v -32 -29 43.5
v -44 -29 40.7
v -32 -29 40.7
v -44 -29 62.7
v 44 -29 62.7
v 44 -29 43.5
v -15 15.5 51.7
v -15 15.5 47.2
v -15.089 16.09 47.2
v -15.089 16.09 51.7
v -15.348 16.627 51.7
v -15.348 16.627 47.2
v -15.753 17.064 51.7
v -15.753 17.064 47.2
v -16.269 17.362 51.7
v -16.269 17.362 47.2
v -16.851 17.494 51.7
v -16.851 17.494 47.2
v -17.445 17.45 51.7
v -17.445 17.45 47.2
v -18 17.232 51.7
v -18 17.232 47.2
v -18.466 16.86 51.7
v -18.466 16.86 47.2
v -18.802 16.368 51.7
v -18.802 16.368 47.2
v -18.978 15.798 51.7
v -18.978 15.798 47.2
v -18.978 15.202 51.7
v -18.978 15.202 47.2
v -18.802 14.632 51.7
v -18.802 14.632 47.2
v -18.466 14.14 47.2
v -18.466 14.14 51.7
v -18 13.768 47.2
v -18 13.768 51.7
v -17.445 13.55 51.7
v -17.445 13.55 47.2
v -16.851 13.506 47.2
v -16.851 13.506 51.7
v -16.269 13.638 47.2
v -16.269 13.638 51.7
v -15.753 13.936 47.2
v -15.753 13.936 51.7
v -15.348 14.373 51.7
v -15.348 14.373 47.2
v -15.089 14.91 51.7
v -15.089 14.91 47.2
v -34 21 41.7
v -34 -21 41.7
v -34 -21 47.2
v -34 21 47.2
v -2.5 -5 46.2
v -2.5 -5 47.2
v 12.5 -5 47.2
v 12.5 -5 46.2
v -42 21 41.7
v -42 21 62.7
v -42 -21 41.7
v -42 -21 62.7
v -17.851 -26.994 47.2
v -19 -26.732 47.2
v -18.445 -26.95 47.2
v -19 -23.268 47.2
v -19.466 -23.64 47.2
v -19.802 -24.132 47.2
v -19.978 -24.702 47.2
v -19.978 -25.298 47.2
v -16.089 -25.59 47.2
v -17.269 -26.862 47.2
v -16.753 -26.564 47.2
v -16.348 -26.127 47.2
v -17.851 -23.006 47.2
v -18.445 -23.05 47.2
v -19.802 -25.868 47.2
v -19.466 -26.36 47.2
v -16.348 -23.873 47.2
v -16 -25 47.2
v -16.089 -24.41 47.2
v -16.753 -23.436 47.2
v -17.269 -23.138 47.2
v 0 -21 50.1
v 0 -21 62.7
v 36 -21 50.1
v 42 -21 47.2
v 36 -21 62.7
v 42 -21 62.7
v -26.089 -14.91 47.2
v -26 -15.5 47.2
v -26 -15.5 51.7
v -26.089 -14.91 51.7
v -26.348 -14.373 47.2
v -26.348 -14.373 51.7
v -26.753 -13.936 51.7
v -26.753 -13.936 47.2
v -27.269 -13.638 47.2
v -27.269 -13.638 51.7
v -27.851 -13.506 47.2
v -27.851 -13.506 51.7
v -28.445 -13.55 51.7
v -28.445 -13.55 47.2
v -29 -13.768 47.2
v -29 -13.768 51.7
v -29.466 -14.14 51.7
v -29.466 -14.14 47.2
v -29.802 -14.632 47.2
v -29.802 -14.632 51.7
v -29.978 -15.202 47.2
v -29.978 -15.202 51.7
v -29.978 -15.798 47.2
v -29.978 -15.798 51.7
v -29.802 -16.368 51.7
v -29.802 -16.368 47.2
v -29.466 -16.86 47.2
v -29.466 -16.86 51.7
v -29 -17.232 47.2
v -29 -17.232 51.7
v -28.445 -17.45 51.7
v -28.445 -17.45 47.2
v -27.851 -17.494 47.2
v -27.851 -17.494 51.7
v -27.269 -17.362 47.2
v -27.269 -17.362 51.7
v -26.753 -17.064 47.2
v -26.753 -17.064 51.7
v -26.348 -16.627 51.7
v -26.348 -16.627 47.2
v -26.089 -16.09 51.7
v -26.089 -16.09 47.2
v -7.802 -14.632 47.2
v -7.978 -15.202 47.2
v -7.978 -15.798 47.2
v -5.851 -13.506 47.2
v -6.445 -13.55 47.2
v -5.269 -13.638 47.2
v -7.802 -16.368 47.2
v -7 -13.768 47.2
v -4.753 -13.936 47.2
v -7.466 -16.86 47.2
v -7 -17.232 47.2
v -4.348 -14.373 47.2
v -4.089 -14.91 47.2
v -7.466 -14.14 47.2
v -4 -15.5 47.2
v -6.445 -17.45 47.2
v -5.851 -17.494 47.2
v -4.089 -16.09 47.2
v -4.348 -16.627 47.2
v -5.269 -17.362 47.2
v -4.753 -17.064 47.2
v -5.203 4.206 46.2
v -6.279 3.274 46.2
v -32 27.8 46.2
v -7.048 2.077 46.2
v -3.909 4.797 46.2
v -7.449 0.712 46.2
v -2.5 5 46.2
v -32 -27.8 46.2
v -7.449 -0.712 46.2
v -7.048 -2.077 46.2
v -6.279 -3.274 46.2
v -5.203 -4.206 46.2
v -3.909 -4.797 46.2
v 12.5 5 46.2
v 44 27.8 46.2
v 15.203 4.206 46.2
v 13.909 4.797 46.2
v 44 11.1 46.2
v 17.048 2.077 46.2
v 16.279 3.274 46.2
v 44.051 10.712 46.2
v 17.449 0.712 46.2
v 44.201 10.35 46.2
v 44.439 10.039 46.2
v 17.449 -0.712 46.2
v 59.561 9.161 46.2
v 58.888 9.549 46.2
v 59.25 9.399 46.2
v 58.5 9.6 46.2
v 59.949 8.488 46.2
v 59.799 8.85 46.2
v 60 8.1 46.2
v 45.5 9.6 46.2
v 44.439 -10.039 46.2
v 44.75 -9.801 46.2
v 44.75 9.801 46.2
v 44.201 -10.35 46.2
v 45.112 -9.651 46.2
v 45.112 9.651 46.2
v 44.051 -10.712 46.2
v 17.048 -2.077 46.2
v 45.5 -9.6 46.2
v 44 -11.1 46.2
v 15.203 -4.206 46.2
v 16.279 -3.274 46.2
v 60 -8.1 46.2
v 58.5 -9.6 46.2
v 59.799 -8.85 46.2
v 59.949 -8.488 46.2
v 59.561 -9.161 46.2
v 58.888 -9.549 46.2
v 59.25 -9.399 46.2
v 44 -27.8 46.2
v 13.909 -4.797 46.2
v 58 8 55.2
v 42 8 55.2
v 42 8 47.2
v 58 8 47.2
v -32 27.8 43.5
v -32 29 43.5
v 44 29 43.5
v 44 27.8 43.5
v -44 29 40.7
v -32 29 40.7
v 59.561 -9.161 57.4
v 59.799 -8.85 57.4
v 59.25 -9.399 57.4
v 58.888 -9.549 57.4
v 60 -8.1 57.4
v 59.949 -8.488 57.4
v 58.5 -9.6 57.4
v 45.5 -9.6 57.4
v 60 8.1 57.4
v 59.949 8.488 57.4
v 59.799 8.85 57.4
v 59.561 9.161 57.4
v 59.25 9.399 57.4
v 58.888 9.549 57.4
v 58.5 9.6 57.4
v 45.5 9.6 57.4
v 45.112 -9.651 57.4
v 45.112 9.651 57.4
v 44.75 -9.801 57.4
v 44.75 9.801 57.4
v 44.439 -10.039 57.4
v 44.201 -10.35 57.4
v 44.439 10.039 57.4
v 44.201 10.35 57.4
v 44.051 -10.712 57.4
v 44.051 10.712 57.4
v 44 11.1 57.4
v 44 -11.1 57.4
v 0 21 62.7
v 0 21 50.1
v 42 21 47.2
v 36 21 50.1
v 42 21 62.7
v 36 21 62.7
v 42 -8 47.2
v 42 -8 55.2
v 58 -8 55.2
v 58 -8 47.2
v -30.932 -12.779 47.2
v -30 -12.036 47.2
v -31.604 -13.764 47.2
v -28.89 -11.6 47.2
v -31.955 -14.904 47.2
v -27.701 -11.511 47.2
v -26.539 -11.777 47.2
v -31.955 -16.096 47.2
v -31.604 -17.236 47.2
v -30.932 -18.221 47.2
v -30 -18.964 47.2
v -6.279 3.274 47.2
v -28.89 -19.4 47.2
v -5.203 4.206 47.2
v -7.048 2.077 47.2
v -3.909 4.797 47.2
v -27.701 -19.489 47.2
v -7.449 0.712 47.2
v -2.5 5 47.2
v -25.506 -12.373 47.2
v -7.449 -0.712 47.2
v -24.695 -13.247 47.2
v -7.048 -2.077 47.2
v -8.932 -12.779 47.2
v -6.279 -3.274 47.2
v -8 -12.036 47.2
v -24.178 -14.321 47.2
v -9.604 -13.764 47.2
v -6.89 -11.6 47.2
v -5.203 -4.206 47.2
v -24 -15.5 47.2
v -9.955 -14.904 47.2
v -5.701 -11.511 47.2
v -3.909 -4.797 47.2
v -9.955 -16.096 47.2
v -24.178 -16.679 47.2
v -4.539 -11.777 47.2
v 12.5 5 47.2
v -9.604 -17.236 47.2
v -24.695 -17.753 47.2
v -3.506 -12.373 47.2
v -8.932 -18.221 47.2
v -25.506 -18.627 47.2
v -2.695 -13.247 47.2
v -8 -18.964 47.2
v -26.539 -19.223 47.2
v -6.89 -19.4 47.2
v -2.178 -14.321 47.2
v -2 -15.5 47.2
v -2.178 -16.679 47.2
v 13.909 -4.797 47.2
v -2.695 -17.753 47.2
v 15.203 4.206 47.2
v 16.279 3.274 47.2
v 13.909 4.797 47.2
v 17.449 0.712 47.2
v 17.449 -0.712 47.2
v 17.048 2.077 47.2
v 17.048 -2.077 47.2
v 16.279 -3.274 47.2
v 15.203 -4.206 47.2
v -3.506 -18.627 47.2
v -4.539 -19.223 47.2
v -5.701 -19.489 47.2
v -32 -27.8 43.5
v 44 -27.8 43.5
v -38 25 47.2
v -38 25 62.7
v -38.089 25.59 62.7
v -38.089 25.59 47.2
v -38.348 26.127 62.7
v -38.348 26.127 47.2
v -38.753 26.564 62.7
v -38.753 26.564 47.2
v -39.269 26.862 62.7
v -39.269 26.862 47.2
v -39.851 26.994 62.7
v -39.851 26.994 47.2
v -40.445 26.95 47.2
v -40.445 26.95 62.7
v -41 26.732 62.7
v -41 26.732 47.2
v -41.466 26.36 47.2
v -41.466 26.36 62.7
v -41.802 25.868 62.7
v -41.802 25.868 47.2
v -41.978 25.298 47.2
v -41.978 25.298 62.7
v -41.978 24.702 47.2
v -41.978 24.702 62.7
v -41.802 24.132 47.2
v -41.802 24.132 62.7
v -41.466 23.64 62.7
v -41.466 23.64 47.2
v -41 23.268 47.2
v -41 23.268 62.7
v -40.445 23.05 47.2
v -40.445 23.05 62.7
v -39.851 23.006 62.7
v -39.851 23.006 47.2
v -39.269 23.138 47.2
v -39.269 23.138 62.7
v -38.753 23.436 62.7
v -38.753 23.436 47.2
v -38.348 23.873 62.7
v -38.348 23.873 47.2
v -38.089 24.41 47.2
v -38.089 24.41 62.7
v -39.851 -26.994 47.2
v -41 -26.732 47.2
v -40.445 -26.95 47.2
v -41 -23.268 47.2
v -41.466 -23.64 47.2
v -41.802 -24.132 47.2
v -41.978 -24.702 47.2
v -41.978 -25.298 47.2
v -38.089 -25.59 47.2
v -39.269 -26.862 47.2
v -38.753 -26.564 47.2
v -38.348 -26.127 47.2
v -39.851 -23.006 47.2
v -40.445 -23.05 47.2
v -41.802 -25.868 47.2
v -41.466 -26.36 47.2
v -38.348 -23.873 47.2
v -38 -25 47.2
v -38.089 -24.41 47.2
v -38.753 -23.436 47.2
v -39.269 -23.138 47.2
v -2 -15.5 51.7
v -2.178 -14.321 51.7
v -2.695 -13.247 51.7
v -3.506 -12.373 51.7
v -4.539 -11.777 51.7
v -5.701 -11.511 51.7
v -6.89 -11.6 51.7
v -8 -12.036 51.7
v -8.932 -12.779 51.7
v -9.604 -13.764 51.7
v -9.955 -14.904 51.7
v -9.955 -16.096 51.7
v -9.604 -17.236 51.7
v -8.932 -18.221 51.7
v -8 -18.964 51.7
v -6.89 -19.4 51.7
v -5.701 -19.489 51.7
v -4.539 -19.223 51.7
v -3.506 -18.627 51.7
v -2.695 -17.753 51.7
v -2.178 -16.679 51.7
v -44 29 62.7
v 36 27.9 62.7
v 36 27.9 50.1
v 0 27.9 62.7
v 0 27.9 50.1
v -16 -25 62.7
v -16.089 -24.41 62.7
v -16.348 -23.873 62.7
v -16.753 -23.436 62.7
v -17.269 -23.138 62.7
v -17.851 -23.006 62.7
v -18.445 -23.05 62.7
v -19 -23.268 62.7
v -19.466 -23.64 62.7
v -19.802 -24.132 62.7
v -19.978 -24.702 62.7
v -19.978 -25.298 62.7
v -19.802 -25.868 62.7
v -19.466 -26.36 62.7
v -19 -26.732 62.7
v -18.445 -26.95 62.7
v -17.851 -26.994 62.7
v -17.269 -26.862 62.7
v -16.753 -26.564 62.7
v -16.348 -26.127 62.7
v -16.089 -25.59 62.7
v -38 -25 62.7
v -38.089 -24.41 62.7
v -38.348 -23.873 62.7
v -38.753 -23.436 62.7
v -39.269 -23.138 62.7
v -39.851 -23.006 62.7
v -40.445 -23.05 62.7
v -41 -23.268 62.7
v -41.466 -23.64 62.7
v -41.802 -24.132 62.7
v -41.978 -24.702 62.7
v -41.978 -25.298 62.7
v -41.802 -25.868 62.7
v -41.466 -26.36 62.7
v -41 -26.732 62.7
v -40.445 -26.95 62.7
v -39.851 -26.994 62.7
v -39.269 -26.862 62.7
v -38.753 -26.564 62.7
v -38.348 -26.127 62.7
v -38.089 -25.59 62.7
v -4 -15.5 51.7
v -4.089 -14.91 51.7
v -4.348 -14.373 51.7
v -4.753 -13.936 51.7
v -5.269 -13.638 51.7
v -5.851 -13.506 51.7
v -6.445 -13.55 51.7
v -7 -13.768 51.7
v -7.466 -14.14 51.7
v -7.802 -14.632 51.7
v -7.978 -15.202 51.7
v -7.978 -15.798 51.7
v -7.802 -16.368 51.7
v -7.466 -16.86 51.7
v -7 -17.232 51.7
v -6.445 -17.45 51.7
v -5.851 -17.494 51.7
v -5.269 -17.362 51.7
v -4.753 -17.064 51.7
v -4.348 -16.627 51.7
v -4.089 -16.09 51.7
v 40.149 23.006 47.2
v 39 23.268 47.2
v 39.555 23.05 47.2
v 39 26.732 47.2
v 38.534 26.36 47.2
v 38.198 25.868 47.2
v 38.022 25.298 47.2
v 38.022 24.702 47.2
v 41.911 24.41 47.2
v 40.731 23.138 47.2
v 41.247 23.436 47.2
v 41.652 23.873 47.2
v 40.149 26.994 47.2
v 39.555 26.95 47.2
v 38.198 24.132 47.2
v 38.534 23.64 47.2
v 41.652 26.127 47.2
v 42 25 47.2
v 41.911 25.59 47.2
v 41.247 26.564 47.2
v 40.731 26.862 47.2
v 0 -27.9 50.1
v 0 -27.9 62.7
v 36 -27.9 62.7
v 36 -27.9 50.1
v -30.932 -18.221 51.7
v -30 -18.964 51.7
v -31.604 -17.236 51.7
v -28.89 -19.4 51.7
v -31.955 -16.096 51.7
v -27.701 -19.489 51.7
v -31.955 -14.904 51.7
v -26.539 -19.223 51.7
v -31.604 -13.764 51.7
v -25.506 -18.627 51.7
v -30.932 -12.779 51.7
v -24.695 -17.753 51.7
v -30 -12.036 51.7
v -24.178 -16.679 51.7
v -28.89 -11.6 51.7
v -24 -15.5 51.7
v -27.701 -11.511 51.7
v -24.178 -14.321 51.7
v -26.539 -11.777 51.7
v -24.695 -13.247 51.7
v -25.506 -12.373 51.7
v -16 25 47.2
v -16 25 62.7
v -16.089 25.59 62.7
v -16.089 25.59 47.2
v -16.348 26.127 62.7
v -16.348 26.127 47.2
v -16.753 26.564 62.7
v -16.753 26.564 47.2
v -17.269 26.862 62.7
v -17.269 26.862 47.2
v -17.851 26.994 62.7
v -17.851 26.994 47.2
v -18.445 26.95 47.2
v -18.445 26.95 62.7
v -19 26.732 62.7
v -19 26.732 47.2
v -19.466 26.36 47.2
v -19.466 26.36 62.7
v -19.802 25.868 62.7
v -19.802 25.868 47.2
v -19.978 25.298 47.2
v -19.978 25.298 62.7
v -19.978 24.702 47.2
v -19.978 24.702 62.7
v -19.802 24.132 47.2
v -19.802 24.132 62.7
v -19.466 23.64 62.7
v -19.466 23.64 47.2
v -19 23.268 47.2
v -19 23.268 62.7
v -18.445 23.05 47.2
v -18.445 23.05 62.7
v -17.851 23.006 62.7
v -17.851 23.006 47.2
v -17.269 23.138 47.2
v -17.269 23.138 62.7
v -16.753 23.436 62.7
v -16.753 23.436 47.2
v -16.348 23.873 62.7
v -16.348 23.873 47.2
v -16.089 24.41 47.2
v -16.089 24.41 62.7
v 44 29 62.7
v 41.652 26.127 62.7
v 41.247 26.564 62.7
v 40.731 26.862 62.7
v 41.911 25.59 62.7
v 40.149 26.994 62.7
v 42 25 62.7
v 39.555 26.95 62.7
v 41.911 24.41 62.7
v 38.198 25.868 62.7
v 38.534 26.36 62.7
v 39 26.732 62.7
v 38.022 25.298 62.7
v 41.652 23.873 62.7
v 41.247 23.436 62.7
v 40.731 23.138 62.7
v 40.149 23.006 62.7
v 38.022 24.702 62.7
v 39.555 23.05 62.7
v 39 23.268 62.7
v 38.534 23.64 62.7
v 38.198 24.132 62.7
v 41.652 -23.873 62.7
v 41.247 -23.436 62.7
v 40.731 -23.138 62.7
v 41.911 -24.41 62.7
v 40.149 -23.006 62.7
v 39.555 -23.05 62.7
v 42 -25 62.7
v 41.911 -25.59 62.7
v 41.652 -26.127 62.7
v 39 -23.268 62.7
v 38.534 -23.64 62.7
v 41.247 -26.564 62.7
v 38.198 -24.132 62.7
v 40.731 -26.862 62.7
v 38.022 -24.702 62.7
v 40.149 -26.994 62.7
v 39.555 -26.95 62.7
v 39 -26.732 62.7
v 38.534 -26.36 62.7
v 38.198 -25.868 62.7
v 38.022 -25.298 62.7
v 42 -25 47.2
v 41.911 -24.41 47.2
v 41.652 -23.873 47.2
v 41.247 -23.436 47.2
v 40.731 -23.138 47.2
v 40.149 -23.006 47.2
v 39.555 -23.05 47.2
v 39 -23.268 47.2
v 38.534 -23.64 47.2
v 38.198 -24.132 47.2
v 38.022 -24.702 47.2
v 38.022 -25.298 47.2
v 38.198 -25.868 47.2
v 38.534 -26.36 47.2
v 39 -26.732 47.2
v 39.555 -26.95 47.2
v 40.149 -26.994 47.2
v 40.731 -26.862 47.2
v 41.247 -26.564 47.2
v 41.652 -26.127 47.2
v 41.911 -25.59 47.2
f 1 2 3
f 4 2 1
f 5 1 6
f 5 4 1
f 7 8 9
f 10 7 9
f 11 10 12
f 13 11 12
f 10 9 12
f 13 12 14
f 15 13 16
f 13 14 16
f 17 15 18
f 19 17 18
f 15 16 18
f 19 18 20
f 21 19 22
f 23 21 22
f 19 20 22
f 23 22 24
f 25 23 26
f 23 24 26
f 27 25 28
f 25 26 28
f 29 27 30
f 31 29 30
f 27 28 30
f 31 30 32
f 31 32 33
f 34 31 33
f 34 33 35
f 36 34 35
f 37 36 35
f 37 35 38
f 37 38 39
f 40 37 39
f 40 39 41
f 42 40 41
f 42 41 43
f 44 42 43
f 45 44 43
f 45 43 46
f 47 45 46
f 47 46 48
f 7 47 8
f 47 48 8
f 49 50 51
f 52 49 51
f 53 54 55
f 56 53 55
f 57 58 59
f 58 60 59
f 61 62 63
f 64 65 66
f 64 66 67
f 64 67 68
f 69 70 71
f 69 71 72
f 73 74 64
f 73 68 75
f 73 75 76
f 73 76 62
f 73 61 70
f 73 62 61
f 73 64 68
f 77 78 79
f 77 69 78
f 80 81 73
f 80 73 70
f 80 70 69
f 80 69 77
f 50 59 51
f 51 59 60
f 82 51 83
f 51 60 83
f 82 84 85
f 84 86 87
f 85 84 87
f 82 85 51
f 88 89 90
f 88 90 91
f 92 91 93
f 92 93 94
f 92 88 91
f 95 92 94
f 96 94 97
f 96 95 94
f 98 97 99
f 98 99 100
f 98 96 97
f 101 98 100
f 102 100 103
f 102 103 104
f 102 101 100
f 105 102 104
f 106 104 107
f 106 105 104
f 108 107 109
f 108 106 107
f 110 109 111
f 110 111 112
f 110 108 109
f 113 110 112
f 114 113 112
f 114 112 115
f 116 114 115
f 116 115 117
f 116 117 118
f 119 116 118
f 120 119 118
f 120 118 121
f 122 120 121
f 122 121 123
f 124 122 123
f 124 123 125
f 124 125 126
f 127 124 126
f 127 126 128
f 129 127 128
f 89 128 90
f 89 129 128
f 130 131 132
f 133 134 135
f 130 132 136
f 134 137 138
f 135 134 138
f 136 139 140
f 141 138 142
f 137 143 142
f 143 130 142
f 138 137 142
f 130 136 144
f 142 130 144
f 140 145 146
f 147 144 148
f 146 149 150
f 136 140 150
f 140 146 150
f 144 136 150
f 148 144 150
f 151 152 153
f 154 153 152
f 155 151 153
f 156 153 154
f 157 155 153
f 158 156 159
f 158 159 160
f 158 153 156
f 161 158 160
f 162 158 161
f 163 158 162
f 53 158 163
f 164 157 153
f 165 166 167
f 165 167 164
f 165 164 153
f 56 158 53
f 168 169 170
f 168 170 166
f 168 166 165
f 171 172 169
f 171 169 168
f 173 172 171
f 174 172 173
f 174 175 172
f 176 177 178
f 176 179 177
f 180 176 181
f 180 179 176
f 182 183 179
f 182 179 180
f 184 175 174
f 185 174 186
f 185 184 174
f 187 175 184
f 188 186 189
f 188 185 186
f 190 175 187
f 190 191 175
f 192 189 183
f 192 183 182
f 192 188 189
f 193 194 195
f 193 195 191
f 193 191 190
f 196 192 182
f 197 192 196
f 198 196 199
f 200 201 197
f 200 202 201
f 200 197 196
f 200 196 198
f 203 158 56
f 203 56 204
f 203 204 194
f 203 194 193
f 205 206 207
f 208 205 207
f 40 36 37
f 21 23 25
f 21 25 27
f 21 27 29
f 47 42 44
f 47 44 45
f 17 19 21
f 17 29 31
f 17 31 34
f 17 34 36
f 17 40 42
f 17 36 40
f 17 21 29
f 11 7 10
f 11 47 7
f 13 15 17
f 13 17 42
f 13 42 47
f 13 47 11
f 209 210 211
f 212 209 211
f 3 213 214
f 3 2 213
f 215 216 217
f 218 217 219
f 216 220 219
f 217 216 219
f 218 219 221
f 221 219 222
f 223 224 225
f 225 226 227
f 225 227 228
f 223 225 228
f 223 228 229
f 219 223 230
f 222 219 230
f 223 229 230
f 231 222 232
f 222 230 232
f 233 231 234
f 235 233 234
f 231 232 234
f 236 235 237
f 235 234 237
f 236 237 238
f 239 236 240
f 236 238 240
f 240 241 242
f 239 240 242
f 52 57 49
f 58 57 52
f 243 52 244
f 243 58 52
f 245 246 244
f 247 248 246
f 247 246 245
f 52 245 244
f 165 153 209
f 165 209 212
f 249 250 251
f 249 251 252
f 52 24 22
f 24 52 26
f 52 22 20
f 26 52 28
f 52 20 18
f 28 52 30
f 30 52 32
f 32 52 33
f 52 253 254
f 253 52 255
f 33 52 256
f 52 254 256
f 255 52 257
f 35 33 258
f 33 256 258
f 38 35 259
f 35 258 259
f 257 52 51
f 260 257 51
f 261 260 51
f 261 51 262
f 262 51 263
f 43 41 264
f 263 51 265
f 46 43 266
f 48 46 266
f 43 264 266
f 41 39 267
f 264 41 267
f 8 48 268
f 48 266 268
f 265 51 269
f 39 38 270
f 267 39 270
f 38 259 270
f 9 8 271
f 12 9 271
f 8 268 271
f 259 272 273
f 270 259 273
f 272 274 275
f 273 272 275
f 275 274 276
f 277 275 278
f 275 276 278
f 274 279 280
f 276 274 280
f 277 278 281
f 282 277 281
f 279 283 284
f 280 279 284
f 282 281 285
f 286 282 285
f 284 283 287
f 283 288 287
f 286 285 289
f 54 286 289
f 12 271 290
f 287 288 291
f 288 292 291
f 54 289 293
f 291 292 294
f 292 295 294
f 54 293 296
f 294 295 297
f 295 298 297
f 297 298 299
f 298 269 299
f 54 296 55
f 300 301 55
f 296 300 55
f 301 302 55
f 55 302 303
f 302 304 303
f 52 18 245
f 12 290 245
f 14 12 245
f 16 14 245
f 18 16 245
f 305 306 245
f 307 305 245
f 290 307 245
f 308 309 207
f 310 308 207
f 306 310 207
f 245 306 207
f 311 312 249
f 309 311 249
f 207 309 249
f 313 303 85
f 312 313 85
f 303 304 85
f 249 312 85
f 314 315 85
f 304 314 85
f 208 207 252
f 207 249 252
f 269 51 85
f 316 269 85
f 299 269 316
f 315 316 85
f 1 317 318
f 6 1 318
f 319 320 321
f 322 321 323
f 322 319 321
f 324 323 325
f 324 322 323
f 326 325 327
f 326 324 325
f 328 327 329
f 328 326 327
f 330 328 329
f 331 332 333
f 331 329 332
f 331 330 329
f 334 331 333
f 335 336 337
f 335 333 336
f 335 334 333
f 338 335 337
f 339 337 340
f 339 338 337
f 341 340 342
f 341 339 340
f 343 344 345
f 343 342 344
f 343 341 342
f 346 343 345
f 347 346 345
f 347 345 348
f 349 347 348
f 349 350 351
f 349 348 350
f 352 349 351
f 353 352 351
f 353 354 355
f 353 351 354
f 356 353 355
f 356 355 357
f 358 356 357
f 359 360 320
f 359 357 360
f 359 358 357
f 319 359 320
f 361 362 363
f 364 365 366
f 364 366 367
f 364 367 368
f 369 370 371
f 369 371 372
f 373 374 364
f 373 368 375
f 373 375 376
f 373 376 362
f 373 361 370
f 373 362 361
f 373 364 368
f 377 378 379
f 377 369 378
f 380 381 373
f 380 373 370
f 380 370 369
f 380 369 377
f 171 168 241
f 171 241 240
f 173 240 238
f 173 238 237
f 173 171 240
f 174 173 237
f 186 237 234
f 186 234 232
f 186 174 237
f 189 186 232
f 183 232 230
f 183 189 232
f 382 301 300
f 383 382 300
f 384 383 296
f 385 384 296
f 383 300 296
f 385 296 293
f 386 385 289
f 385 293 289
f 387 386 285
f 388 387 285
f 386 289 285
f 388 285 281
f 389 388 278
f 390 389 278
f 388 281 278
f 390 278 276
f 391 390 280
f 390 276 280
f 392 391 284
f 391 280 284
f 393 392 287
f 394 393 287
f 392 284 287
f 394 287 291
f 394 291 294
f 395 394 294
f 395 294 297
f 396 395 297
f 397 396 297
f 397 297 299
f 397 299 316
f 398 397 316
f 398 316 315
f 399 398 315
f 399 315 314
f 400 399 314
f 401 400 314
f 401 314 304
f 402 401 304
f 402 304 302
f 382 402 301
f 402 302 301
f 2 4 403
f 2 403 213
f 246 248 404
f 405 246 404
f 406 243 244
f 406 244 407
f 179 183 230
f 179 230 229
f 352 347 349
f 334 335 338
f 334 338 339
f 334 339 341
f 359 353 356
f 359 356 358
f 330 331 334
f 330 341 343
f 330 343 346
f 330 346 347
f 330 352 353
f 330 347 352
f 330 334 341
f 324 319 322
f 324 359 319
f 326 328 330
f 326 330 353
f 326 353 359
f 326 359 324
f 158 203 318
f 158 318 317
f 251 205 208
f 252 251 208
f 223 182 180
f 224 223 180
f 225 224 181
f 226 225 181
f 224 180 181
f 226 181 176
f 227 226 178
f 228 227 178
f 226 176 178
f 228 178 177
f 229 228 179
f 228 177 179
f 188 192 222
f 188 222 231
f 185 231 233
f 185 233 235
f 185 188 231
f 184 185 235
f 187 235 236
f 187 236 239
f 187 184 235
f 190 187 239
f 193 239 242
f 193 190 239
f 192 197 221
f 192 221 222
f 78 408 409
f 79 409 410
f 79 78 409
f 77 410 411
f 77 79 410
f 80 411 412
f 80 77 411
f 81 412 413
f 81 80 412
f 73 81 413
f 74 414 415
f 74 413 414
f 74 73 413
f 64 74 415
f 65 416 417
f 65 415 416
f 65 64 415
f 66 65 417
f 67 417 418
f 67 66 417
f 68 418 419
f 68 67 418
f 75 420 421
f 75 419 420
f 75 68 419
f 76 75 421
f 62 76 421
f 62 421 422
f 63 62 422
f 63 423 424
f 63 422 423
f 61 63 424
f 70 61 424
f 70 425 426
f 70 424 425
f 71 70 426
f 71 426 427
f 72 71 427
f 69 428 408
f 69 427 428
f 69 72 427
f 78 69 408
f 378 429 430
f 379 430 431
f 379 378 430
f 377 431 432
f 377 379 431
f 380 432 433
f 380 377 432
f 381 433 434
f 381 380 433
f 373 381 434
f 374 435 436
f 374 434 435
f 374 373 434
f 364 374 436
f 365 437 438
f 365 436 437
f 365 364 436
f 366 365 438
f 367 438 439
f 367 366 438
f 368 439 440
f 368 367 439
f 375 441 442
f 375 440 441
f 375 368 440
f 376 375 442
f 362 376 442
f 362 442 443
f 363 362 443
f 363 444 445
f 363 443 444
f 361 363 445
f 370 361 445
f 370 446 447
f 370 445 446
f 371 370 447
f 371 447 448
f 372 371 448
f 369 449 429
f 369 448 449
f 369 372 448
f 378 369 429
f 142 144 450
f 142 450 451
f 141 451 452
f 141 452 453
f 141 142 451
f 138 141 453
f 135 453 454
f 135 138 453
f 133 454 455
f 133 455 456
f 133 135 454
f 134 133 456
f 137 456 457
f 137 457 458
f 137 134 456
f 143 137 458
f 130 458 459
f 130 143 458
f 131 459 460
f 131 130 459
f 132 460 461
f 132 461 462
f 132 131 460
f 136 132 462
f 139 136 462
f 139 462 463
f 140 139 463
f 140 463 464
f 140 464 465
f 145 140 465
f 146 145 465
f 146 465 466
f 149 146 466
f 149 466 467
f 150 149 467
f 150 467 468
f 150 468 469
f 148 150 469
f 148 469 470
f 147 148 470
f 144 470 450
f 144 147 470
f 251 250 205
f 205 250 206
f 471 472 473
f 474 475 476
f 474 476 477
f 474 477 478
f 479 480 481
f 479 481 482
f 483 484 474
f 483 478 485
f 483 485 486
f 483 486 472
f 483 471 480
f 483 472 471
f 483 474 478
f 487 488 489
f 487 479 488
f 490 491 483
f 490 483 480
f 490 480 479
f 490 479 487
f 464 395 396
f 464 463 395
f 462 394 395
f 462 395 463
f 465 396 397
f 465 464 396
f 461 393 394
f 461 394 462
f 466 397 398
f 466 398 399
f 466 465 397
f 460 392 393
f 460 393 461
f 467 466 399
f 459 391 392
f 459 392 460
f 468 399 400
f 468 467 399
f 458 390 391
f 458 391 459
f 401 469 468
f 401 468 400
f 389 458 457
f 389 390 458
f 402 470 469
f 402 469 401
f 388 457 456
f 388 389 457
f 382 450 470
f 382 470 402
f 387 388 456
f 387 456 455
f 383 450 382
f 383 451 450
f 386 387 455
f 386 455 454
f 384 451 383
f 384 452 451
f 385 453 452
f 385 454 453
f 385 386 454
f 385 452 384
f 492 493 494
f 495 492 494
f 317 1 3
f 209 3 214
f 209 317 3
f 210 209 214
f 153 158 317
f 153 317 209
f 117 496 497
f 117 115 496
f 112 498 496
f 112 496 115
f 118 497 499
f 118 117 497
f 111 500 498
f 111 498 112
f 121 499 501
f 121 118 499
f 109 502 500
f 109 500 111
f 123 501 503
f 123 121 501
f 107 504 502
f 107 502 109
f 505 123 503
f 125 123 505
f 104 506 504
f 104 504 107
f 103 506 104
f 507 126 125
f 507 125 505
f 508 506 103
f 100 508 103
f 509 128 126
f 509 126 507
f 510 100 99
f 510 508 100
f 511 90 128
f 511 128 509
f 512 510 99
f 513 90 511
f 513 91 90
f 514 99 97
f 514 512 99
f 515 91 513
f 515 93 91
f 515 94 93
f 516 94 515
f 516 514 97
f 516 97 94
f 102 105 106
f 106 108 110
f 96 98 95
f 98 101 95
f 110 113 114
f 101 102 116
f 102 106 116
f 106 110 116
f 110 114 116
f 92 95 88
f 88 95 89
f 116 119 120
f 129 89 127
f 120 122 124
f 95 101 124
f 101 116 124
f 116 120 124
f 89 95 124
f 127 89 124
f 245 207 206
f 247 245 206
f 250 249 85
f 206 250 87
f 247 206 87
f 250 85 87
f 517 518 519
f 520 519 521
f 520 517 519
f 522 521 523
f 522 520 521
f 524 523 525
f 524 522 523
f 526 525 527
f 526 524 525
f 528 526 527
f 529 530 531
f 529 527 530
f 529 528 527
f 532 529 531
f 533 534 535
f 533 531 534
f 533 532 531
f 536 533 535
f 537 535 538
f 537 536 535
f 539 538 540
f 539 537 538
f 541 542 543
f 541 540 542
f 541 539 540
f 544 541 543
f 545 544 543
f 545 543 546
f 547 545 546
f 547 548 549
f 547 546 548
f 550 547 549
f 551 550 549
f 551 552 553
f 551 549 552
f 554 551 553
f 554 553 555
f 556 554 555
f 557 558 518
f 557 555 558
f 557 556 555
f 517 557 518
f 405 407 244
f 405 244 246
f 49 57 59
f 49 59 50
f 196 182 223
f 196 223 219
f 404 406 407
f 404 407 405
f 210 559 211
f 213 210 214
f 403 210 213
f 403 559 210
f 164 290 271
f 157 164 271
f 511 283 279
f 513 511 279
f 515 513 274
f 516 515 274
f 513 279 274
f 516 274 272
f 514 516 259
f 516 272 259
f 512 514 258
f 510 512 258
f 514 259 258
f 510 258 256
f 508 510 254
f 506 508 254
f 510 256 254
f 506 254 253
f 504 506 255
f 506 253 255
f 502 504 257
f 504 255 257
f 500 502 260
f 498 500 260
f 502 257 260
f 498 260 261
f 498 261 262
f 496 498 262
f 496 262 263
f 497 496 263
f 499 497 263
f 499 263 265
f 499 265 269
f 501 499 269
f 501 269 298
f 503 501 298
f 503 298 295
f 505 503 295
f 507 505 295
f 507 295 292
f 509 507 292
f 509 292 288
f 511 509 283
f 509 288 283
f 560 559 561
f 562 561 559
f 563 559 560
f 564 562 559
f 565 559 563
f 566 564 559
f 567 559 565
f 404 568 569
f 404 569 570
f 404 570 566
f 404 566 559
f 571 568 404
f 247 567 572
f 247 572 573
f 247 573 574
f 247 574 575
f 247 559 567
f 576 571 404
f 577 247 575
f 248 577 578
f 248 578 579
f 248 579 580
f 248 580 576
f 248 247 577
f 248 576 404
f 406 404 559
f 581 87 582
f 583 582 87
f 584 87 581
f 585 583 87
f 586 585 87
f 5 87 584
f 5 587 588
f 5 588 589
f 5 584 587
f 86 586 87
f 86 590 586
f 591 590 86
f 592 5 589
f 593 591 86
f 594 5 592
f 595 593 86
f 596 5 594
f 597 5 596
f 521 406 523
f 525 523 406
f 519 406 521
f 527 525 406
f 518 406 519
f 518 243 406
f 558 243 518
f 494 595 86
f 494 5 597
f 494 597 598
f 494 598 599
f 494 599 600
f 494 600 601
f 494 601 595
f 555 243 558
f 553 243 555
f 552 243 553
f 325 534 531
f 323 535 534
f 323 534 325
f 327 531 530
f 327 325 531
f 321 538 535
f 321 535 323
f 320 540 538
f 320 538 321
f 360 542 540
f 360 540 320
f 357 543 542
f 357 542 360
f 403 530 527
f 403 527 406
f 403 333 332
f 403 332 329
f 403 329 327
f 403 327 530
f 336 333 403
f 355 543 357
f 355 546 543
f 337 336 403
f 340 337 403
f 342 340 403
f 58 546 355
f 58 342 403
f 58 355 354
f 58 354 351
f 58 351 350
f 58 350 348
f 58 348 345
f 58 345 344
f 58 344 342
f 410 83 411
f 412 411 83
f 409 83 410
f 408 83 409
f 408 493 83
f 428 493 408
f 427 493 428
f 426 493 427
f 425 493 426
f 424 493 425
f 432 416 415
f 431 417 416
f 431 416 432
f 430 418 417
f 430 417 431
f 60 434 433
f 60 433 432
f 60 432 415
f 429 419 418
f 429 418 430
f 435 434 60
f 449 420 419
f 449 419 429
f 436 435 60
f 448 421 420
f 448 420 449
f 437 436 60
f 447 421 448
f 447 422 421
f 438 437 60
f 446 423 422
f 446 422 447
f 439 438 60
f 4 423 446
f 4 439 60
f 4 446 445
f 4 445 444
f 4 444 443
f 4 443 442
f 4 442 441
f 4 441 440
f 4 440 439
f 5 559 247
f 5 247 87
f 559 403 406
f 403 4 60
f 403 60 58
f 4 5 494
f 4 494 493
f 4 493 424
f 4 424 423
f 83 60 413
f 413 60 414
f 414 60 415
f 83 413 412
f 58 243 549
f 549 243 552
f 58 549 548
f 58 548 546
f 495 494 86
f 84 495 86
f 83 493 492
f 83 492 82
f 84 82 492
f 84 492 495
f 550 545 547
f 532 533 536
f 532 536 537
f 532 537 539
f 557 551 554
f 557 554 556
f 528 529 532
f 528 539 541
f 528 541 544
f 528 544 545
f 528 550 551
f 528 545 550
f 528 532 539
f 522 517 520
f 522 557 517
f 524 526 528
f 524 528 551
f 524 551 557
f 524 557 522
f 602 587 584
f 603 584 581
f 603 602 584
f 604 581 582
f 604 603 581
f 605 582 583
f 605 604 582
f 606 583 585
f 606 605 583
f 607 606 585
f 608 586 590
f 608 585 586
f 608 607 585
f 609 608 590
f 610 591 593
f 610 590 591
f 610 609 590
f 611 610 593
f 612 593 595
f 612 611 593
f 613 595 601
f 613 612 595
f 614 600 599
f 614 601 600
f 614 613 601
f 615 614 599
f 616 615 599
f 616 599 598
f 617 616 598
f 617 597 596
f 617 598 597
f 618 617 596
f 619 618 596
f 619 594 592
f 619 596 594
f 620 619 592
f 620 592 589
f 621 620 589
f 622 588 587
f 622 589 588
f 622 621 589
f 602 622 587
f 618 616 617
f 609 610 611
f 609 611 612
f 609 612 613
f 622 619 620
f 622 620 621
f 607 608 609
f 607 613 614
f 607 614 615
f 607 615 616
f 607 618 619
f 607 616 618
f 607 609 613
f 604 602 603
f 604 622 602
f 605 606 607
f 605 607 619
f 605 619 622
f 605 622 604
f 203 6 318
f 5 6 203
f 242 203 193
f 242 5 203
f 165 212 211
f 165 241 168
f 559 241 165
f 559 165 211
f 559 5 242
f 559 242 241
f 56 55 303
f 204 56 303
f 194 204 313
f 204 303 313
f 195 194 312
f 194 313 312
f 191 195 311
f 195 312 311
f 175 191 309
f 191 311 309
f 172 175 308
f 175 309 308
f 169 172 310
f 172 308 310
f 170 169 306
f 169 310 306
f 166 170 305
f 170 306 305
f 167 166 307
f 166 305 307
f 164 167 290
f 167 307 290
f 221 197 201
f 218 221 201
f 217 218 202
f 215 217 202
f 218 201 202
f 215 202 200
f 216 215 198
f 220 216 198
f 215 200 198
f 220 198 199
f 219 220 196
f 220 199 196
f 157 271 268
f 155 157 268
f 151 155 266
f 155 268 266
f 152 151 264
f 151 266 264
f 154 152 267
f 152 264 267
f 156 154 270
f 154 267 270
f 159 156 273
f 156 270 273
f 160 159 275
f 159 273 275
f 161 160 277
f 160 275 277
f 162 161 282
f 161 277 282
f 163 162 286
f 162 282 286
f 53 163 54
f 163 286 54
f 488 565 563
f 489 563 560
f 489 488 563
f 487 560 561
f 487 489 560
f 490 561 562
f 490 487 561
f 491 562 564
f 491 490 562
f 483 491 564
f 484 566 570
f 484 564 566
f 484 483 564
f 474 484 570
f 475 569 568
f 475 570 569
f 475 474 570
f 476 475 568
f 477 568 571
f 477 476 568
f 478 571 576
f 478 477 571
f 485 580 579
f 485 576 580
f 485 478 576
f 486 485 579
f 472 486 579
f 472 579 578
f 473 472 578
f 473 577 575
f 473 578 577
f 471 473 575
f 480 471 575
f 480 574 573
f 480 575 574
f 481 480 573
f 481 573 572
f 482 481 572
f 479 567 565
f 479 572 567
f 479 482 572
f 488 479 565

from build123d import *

# Parameters (mm, degrees)
PAD_DEPTH       = 29
POCKET_DEPTH    = 21
SKETCH003_R     = 2
SKETCH003_R_2   = 4
PAD002_DEPTH    = 4.5
SKETCH007_R     = 2
POCKET002_DEPTH = 16.5
SKETCH008_W     = 36
SKETCH008_H     = 55.8
POCKET003_DEPTH = 12.6
POCKET004_DEPTH = 1
PAD005_DEPTH    = 11.2
SKETCH011_W     = 8
SKETCH011_H     = 16
POCKET005_DEPTH = 16
PAD013_DEPTH    = 2.7


with BuildPart() as part:
    # Sketch → Pad (new body, symmetric)
    with BuildSketch(Plane.XZ):
        Polygon((-32, 0), (44, 0), (44, 16.5), (-44, 16.5), (-44, -5.5), (-32, -5.5), align=None)
    extrude(amount=PAD_DEPTH, both=True)

    # Sketch002 → Pocket (cut, symmetric)
    with BuildSketch(Plane.XZ):
        Polygon((-42, 16.5), (-42, -4.5), (-34, -4.5), (-34, 1), (42, 1), (42, 16.5), align=None)
    extrude(amount=POCKET_DEPTH, both=True, mode=Mode.SUBTRACT)

    # Sketch003 (on DatumPlane) → Pad002 (join)
    with BuildSketch(Plane.XY.offset(1)):
        with Locations((-17, 15.5)):
            Circle(SKETCH003_R)
        with Locations((-6, -15.5)):
            Circle(SKETCH003_R_2)
        with Locations((-6, -15.5)):
            Circle(SKETCH003_R, mode=Mode.SUBTRACT)
        with Locations((-28, -15.5)):
            Circle(SKETCH003_R_2)
        with Locations((-28, -15.5)):
            Circle(SKETCH003_R, mode=Mode.SUBTRACT)
    extrude(amount=PAD002_DEPTH)

    # Sketch007 (on DatumPlane) → Pocket002 (cut)
    with BuildSketch(Plane.XY.offset(1)):
        with Locations((-40, 25)):
            Circle(SKETCH007_R)
        with Locations((-18, 25)):
            Circle(SKETCH007_R)
        with Locations((40, 25)):
            Circle(SKETCH007_R)
        with Locations((40, -25)):
            Circle(SKETCH007_R)
        with Locations((-40, -25)):
            Circle(SKETCH007_R)
        with Locations((-18, -25)):
            Circle(SKETCH007_R)
    extrude(amount=POCKET002_DEPTH, mode=Mode.SUBTRACT)

    # Sketch008 (on DatumPlane) → Pocket003 (cut)
    with BuildSketch(Plane.XY.offset(16.5)):
        with Locations((18, 0)):
            Rectangle(SKETCH008_W, SKETCH008_H)
    extrude(amount=-POCKET003_DEPTH, mode=Mode.SUBTRACT)

    # Sketch009 (on DatumPlane) → Pocket004 (cut)
    with BuildSketch(Plane.XY.offset(1)):
        with BuildLine():
            ThreePointArc((-2.5, 5), (-7.5, 0), (-2.5, -5))
            Line((-2.5, -5), (12.5, -5))
            ThreePointArc((12.5, -5), (17.5, 0), (12.5, 5))
            Line((12.5, 5), (-2.5, 5))
        make_face()
    extrude(amount=-POCKET004_DEPTH, mode=Mode.SUBTRACT)

    # Sketch010 → Pad005 (join)
    with BuildSketch(Plane.XY):
        with BuildLine():
            Line((45.5, 9.6), (58.5, 9.6))
            ThreePointArc((60, 8.1), (59.56066, 9.16066), (58.5, 9.6))
            Line((60, 8.1), (60, -8.1))
            ThreePointArc((58.5, -9.6), (59.56066, -9.16066), (60, -8.1))
            Line((58.5, -9.6), (45.5, -9.6))
            ThreePointArc((45.5, -9.6), (44.43934, -10.03934), (44, -11.1))
            Line((44, 11.1), (44, -11.1))
            ThreePointArc((44, 11.1), (44.43934, 10.03934), (45.5, 9.6))
        make_face()
    extrude(amount=PAD005_DEPTH)

    # Sketch011 (on DatumPlane) → Pocket005 (cut)
    with BuildSketch(Plane(origin=(42, 0, 0), x_dir=(0, 0, -1), z_dir=(1, 0, 0))):
        with Locations((-5, 0)):
            Rectangle(SKETCH011_W, SKETCH011_H)
    extrude(amount=POCKET005_DEPTH, mode=Mode.SUBTRACT)

    # Sketch019 → Pad013 (join)
    with BuildSketch(Plane.XY):
        Polygon((-32, 27.8), (44, 27.8), (44, 29), (-32.4, 29), (-32.4, -29), (44, -29), (44, -27.8), (-32, -27.8), align=None)
    extrude(amount=-PAD013_DEPTH)


with BuildPart() as part_1:
    # Body placement: moved
    add(part.part.moved(Location((0, 0, 46.2))))


solid = part_1.part
